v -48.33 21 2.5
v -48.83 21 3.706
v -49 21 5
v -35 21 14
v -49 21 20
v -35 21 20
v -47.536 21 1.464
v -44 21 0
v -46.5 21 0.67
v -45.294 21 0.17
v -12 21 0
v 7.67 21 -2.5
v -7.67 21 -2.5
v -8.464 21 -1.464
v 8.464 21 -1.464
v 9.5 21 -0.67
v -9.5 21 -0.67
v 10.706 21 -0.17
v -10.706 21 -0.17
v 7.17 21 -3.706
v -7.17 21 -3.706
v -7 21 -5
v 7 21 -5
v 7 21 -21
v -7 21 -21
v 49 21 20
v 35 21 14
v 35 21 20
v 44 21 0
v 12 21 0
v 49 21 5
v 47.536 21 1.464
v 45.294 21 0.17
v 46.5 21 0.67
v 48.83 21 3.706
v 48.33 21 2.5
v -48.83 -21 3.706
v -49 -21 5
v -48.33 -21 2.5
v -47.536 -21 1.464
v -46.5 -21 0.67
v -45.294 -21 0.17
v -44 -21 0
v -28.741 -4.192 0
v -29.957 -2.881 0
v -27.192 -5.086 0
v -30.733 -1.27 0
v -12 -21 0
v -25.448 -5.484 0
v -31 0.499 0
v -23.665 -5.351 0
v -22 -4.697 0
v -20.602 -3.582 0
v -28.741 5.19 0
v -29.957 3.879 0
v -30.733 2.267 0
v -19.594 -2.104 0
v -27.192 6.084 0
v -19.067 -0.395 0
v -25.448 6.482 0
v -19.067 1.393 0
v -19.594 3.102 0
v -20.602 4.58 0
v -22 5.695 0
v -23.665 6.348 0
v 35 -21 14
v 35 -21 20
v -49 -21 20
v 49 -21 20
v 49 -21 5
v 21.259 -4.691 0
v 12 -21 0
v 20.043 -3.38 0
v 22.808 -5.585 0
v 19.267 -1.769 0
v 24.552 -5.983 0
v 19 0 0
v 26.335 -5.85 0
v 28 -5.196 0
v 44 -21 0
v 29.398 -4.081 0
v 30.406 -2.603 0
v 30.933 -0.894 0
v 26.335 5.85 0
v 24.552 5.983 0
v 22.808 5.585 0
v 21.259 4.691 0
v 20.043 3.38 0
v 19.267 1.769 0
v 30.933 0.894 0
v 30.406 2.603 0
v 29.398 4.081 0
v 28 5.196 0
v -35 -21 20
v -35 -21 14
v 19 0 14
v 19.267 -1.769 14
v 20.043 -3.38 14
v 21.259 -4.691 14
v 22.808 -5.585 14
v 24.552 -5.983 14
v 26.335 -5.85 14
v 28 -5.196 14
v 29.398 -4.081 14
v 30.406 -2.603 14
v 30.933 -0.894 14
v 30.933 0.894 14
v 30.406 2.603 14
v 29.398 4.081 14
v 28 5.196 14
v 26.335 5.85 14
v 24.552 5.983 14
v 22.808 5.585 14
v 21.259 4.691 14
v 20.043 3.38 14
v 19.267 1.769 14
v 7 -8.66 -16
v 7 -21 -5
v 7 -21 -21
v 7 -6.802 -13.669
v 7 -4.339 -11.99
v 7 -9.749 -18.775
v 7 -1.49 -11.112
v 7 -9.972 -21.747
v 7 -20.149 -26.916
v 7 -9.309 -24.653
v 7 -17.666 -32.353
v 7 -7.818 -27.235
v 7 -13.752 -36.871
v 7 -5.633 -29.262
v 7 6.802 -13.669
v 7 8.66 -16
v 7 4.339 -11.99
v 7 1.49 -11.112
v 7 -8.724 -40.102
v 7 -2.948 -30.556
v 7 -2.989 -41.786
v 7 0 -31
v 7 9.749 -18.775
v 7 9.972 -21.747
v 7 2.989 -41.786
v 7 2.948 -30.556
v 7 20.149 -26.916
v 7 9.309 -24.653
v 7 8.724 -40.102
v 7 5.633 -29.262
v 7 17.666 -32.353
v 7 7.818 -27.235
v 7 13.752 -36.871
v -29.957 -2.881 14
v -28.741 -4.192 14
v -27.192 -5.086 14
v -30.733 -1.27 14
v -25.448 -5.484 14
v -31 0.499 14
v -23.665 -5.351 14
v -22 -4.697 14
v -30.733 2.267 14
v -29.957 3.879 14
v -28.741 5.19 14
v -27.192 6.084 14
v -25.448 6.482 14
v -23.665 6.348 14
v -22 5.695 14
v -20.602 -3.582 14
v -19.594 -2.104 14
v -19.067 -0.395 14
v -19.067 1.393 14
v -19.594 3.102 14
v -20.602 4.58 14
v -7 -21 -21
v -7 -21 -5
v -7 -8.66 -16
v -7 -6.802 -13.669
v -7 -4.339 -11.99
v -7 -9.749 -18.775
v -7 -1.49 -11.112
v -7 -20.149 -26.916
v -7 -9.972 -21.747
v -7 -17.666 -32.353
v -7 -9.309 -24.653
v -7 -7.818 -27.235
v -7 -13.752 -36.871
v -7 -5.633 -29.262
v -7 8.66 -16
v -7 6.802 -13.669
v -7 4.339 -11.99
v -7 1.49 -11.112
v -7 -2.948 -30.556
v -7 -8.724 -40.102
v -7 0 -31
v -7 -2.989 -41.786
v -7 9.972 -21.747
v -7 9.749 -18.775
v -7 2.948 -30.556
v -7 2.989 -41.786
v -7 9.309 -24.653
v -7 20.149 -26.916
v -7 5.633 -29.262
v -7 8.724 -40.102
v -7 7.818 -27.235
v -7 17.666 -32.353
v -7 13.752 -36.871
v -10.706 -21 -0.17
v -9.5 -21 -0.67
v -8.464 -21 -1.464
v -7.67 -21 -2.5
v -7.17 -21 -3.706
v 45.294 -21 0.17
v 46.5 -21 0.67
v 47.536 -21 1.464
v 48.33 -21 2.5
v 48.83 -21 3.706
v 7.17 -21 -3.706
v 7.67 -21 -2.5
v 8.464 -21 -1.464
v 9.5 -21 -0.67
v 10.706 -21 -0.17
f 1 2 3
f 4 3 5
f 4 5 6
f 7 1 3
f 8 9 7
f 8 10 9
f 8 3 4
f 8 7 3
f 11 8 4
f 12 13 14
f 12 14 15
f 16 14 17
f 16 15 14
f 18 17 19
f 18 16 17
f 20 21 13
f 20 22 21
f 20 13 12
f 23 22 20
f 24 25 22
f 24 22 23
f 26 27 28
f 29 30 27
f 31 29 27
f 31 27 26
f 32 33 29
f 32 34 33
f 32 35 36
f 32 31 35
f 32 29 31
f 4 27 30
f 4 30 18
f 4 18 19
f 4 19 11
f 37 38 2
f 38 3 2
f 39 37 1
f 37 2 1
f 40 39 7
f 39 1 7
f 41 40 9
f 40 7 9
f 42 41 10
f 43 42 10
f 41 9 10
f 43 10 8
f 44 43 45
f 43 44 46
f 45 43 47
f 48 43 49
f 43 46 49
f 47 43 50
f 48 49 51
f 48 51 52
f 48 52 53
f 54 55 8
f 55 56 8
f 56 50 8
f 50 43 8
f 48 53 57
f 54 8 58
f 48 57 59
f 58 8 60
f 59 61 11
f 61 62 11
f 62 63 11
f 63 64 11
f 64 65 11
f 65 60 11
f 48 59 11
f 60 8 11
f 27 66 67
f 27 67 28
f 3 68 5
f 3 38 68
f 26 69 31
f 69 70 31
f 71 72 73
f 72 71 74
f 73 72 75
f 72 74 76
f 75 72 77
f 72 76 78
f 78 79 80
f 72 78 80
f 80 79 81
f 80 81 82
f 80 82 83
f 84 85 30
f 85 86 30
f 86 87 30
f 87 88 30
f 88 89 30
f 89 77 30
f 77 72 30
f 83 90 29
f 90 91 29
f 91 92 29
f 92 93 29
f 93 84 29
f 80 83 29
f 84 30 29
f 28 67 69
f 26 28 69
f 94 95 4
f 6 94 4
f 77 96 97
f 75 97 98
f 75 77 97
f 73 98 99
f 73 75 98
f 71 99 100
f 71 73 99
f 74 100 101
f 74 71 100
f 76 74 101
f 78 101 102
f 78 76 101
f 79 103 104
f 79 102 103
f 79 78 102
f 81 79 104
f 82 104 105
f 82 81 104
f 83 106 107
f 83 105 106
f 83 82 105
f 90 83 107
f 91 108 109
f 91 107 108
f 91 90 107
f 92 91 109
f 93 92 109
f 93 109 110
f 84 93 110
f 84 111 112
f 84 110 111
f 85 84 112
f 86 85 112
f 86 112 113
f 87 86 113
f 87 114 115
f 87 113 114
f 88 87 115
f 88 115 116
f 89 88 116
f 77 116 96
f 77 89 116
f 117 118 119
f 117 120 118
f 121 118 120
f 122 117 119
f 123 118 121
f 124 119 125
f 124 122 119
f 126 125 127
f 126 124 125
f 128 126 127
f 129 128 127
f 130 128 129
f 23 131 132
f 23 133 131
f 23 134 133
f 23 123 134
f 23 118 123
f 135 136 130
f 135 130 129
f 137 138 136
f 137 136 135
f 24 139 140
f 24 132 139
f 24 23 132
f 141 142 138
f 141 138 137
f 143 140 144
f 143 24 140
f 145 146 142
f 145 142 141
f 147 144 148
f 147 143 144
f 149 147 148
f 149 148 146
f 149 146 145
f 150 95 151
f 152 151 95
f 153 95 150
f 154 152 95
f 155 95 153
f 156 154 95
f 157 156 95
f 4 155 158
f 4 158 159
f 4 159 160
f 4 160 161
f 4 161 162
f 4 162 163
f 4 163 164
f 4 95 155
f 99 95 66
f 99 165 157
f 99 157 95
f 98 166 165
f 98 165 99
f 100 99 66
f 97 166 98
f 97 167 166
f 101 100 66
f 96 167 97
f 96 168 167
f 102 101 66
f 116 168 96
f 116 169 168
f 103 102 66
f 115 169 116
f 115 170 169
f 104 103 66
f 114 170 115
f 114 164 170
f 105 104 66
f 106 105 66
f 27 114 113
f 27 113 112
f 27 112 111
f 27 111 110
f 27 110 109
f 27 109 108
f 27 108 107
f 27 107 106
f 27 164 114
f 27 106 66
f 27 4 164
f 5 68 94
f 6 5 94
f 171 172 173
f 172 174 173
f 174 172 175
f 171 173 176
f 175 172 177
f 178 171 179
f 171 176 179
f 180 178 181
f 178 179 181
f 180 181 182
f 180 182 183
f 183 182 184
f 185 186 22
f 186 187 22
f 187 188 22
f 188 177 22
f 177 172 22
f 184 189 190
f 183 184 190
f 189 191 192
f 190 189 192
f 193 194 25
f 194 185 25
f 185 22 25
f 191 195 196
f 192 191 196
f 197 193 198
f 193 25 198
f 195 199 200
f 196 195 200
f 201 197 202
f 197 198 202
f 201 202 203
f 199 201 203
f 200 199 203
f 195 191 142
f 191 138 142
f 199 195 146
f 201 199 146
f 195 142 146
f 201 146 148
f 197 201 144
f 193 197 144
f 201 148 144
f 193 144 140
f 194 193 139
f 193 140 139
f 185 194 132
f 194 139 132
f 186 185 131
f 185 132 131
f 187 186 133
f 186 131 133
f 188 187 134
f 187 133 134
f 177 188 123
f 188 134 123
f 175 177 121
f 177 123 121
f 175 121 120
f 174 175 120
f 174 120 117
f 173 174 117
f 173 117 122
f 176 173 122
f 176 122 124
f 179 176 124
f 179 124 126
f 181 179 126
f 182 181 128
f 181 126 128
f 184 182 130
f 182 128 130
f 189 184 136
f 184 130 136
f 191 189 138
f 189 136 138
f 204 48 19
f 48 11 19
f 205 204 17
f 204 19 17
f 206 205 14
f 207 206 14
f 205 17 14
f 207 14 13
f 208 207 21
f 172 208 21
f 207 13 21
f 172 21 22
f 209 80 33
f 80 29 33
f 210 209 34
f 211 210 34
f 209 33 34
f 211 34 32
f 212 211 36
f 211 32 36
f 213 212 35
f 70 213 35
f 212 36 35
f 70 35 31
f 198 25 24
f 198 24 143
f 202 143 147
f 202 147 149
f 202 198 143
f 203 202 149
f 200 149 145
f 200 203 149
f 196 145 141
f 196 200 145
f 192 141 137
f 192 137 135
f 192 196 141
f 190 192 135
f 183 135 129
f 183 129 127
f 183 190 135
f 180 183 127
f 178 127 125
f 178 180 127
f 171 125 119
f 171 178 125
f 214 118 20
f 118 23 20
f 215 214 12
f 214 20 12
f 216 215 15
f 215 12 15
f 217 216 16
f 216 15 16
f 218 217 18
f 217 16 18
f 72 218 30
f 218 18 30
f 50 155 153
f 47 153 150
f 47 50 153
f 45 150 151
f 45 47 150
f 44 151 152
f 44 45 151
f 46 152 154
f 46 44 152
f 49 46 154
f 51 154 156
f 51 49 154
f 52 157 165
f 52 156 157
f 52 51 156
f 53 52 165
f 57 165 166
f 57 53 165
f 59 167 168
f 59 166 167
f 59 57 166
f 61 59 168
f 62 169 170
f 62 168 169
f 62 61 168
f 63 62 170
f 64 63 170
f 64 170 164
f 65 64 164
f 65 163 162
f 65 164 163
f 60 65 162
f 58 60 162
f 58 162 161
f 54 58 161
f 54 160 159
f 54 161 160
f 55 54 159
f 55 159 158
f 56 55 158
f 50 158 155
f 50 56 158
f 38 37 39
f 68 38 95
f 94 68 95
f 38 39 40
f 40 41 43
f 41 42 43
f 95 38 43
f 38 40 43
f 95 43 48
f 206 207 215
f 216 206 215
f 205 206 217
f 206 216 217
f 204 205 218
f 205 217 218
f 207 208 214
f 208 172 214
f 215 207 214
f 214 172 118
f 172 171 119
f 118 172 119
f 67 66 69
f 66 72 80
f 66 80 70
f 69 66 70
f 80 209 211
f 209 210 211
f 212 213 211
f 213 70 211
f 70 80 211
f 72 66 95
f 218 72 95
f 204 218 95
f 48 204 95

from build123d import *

# Parameters (mm, degrees)
SKETCH1_W           = 98
SKETCH1_H           = 42
BOSS_EXTRUDE1_DEPTH = 14
SKETCH3_R           = 6
CUT_EXTRUDE1_DEPTH  = 31
SKETCH3_3_R         = 6
CUT_EXTRUDE2_DEPTH  = 150
FILLET1_R           = 5
SKETCH4_W           = 14
SKETCH4_H           = 42
BOSS_EXTRUDE2_DEPTH = 6
FILLET2_R           = 5
SKETCH5_W           = 14
SKETCH5_H           = 42
BOSS_EXTRUDE3_DEPTH = 6
SKETCH6_W           = 42
SKETCH6_H           = 42
BOSS_EXTRUDE4_DEPTH = 7
FILLET4_RADIUS      = 21
FILLET4_LENGTH      = 14
SKETCH7_R           = 10
CUT_EXTRUDE3_DEPTH  = 20.5
FILLET5_R           = 5


with BuildPart() as part:
    # Sketch1 → Boss-Extrude1 (new body)
    with BuildSketch(Plane.XY):
        Rectangle(SKETCH1_W, SKETCH1_H)
    extrude(amount=BOSS_EXTRUDE1_DEPTH)

    # Sketch3 → Cut-Extrude1 (cut)
    with BuildSketch(Plane.XY):
        with Locations(Location((25, 0, 0), (0, 0, 180))):
            Circle(SKETCH3_R)
    extrude(amount=CUT_EXTRUDE1_DEPTH, mode=Mode.SUBTRACT)

    # Sketch3<3> → Cut-Extrude2 (cut)
    with BuildSketch(Plane.XY):
        with Locations(Location((-25, 0.49893218, 0), (0, 0, 180))):
            Circle(SKETCH3_3_R)
        with Locations(Location((25, 0, 0), (0, 0, 180))):
            Circle(SKETCH3_3_R)
    extrude(amount=CUT_EXTRUDE2_DEPTH, mode=Mode.SUBTRACT)

    # Fillet1
    fillet1_edges = [part.edges().sort_by_distance(p)[0] for p in [
        (-49, 0, 0),
    ]]
    fillet(fillet1_edges, radius=FILLET1_R)

    # Sketch4 → Boss-Extrude2 (add)
    with BuildSketch(Plane.XY.offset(14)):
        with Locations((-42, 0)):
            Rectangle(SKETCH4_W, SKETCH4_H)
    extrude(amount=BOSS_EXTRUDE2_DEPTH)

    # Fillet2
    fillet2_edges = [part.edges().sort_by_distance(p)[0] for p in [
        (49, 0, 0),
    ]]
    fillet(fillet2_edges, radius=FILLET2_R)

    # Sketch5 → Boss-Extrude3 (add)
    with BuildSketch(Plane.XY.offset(14)):
        with Locations((42, 0)):
            Rectangle(SKETCH5_W, SKETCH5_H)
    extrude(amount=BOSS_EXTRUDE3_DEPTH)

    # Sketch6 → Boss-Extrude4 (add, symmetric)
    with BuildSketch(Plane(origin=(0, 0, 0), x_dir=(0, 0, -1), z_dir=(1, 0, 0))):
        with Locations((21, 0)):
            Rectangle(SKETCH6_W, SKETCH6_H)
    extrude(amount=BOSS_EXTRUDE4_DEPTH, both=True)

    # Fillet4: full round fillet: the end face becomes a half cylinder, R = half its width
    fillet4_face = Plane((0, 0, -42), x_dir=(-1, 0, 0), z_dir=(0, 0, -1))  # on the end face: x along it, z out of the body
    fillet4_slab = fillet4_face.offset(-FILLET4_RADIUS / 2) * Box(FILLET4_LENGTH, 2 * FILLET4_RADIUS, FILLET4_RADIUS, mode=Mode.PRIVATE)  # the body's end, R deep
    fillet4_round = Plane((0, 0, -21), x_dir=(0, 0, -1), z_dir=(-1, 0, 0)) * Cylinder(FILLET4_RADIUS, FILLET4_LENGTH, mode=Mode.PRIVATE)  # its axis R under the face
    add(fillet4_slab - fillet4_round, mode=Mode.SUBTRACT)

    # Sketch7 → Cut-Extrude3 (cut, symmetric)
    with BuildSketch(Plane(origin=(0, 0, 0), x_dir=(0, 0, -1), z_dir=(1, 0, 0))):
        with Locations((21, 0)):
            Circle(SKETCH7_R)
    extrude(amount=CUT_EXTRUDE3_DEPTH, both=True, mode=Mode.SUBTRACT)

    # Fillet5
    fillet5_edges = [part.edges().sort_by_distance(p)[0] for p in [
        (-7, 0, 0),
        (7, 0, 0),
    ]]
    fillet(fillet5_edges, radius=FILLET5_R)


solid = part.part
